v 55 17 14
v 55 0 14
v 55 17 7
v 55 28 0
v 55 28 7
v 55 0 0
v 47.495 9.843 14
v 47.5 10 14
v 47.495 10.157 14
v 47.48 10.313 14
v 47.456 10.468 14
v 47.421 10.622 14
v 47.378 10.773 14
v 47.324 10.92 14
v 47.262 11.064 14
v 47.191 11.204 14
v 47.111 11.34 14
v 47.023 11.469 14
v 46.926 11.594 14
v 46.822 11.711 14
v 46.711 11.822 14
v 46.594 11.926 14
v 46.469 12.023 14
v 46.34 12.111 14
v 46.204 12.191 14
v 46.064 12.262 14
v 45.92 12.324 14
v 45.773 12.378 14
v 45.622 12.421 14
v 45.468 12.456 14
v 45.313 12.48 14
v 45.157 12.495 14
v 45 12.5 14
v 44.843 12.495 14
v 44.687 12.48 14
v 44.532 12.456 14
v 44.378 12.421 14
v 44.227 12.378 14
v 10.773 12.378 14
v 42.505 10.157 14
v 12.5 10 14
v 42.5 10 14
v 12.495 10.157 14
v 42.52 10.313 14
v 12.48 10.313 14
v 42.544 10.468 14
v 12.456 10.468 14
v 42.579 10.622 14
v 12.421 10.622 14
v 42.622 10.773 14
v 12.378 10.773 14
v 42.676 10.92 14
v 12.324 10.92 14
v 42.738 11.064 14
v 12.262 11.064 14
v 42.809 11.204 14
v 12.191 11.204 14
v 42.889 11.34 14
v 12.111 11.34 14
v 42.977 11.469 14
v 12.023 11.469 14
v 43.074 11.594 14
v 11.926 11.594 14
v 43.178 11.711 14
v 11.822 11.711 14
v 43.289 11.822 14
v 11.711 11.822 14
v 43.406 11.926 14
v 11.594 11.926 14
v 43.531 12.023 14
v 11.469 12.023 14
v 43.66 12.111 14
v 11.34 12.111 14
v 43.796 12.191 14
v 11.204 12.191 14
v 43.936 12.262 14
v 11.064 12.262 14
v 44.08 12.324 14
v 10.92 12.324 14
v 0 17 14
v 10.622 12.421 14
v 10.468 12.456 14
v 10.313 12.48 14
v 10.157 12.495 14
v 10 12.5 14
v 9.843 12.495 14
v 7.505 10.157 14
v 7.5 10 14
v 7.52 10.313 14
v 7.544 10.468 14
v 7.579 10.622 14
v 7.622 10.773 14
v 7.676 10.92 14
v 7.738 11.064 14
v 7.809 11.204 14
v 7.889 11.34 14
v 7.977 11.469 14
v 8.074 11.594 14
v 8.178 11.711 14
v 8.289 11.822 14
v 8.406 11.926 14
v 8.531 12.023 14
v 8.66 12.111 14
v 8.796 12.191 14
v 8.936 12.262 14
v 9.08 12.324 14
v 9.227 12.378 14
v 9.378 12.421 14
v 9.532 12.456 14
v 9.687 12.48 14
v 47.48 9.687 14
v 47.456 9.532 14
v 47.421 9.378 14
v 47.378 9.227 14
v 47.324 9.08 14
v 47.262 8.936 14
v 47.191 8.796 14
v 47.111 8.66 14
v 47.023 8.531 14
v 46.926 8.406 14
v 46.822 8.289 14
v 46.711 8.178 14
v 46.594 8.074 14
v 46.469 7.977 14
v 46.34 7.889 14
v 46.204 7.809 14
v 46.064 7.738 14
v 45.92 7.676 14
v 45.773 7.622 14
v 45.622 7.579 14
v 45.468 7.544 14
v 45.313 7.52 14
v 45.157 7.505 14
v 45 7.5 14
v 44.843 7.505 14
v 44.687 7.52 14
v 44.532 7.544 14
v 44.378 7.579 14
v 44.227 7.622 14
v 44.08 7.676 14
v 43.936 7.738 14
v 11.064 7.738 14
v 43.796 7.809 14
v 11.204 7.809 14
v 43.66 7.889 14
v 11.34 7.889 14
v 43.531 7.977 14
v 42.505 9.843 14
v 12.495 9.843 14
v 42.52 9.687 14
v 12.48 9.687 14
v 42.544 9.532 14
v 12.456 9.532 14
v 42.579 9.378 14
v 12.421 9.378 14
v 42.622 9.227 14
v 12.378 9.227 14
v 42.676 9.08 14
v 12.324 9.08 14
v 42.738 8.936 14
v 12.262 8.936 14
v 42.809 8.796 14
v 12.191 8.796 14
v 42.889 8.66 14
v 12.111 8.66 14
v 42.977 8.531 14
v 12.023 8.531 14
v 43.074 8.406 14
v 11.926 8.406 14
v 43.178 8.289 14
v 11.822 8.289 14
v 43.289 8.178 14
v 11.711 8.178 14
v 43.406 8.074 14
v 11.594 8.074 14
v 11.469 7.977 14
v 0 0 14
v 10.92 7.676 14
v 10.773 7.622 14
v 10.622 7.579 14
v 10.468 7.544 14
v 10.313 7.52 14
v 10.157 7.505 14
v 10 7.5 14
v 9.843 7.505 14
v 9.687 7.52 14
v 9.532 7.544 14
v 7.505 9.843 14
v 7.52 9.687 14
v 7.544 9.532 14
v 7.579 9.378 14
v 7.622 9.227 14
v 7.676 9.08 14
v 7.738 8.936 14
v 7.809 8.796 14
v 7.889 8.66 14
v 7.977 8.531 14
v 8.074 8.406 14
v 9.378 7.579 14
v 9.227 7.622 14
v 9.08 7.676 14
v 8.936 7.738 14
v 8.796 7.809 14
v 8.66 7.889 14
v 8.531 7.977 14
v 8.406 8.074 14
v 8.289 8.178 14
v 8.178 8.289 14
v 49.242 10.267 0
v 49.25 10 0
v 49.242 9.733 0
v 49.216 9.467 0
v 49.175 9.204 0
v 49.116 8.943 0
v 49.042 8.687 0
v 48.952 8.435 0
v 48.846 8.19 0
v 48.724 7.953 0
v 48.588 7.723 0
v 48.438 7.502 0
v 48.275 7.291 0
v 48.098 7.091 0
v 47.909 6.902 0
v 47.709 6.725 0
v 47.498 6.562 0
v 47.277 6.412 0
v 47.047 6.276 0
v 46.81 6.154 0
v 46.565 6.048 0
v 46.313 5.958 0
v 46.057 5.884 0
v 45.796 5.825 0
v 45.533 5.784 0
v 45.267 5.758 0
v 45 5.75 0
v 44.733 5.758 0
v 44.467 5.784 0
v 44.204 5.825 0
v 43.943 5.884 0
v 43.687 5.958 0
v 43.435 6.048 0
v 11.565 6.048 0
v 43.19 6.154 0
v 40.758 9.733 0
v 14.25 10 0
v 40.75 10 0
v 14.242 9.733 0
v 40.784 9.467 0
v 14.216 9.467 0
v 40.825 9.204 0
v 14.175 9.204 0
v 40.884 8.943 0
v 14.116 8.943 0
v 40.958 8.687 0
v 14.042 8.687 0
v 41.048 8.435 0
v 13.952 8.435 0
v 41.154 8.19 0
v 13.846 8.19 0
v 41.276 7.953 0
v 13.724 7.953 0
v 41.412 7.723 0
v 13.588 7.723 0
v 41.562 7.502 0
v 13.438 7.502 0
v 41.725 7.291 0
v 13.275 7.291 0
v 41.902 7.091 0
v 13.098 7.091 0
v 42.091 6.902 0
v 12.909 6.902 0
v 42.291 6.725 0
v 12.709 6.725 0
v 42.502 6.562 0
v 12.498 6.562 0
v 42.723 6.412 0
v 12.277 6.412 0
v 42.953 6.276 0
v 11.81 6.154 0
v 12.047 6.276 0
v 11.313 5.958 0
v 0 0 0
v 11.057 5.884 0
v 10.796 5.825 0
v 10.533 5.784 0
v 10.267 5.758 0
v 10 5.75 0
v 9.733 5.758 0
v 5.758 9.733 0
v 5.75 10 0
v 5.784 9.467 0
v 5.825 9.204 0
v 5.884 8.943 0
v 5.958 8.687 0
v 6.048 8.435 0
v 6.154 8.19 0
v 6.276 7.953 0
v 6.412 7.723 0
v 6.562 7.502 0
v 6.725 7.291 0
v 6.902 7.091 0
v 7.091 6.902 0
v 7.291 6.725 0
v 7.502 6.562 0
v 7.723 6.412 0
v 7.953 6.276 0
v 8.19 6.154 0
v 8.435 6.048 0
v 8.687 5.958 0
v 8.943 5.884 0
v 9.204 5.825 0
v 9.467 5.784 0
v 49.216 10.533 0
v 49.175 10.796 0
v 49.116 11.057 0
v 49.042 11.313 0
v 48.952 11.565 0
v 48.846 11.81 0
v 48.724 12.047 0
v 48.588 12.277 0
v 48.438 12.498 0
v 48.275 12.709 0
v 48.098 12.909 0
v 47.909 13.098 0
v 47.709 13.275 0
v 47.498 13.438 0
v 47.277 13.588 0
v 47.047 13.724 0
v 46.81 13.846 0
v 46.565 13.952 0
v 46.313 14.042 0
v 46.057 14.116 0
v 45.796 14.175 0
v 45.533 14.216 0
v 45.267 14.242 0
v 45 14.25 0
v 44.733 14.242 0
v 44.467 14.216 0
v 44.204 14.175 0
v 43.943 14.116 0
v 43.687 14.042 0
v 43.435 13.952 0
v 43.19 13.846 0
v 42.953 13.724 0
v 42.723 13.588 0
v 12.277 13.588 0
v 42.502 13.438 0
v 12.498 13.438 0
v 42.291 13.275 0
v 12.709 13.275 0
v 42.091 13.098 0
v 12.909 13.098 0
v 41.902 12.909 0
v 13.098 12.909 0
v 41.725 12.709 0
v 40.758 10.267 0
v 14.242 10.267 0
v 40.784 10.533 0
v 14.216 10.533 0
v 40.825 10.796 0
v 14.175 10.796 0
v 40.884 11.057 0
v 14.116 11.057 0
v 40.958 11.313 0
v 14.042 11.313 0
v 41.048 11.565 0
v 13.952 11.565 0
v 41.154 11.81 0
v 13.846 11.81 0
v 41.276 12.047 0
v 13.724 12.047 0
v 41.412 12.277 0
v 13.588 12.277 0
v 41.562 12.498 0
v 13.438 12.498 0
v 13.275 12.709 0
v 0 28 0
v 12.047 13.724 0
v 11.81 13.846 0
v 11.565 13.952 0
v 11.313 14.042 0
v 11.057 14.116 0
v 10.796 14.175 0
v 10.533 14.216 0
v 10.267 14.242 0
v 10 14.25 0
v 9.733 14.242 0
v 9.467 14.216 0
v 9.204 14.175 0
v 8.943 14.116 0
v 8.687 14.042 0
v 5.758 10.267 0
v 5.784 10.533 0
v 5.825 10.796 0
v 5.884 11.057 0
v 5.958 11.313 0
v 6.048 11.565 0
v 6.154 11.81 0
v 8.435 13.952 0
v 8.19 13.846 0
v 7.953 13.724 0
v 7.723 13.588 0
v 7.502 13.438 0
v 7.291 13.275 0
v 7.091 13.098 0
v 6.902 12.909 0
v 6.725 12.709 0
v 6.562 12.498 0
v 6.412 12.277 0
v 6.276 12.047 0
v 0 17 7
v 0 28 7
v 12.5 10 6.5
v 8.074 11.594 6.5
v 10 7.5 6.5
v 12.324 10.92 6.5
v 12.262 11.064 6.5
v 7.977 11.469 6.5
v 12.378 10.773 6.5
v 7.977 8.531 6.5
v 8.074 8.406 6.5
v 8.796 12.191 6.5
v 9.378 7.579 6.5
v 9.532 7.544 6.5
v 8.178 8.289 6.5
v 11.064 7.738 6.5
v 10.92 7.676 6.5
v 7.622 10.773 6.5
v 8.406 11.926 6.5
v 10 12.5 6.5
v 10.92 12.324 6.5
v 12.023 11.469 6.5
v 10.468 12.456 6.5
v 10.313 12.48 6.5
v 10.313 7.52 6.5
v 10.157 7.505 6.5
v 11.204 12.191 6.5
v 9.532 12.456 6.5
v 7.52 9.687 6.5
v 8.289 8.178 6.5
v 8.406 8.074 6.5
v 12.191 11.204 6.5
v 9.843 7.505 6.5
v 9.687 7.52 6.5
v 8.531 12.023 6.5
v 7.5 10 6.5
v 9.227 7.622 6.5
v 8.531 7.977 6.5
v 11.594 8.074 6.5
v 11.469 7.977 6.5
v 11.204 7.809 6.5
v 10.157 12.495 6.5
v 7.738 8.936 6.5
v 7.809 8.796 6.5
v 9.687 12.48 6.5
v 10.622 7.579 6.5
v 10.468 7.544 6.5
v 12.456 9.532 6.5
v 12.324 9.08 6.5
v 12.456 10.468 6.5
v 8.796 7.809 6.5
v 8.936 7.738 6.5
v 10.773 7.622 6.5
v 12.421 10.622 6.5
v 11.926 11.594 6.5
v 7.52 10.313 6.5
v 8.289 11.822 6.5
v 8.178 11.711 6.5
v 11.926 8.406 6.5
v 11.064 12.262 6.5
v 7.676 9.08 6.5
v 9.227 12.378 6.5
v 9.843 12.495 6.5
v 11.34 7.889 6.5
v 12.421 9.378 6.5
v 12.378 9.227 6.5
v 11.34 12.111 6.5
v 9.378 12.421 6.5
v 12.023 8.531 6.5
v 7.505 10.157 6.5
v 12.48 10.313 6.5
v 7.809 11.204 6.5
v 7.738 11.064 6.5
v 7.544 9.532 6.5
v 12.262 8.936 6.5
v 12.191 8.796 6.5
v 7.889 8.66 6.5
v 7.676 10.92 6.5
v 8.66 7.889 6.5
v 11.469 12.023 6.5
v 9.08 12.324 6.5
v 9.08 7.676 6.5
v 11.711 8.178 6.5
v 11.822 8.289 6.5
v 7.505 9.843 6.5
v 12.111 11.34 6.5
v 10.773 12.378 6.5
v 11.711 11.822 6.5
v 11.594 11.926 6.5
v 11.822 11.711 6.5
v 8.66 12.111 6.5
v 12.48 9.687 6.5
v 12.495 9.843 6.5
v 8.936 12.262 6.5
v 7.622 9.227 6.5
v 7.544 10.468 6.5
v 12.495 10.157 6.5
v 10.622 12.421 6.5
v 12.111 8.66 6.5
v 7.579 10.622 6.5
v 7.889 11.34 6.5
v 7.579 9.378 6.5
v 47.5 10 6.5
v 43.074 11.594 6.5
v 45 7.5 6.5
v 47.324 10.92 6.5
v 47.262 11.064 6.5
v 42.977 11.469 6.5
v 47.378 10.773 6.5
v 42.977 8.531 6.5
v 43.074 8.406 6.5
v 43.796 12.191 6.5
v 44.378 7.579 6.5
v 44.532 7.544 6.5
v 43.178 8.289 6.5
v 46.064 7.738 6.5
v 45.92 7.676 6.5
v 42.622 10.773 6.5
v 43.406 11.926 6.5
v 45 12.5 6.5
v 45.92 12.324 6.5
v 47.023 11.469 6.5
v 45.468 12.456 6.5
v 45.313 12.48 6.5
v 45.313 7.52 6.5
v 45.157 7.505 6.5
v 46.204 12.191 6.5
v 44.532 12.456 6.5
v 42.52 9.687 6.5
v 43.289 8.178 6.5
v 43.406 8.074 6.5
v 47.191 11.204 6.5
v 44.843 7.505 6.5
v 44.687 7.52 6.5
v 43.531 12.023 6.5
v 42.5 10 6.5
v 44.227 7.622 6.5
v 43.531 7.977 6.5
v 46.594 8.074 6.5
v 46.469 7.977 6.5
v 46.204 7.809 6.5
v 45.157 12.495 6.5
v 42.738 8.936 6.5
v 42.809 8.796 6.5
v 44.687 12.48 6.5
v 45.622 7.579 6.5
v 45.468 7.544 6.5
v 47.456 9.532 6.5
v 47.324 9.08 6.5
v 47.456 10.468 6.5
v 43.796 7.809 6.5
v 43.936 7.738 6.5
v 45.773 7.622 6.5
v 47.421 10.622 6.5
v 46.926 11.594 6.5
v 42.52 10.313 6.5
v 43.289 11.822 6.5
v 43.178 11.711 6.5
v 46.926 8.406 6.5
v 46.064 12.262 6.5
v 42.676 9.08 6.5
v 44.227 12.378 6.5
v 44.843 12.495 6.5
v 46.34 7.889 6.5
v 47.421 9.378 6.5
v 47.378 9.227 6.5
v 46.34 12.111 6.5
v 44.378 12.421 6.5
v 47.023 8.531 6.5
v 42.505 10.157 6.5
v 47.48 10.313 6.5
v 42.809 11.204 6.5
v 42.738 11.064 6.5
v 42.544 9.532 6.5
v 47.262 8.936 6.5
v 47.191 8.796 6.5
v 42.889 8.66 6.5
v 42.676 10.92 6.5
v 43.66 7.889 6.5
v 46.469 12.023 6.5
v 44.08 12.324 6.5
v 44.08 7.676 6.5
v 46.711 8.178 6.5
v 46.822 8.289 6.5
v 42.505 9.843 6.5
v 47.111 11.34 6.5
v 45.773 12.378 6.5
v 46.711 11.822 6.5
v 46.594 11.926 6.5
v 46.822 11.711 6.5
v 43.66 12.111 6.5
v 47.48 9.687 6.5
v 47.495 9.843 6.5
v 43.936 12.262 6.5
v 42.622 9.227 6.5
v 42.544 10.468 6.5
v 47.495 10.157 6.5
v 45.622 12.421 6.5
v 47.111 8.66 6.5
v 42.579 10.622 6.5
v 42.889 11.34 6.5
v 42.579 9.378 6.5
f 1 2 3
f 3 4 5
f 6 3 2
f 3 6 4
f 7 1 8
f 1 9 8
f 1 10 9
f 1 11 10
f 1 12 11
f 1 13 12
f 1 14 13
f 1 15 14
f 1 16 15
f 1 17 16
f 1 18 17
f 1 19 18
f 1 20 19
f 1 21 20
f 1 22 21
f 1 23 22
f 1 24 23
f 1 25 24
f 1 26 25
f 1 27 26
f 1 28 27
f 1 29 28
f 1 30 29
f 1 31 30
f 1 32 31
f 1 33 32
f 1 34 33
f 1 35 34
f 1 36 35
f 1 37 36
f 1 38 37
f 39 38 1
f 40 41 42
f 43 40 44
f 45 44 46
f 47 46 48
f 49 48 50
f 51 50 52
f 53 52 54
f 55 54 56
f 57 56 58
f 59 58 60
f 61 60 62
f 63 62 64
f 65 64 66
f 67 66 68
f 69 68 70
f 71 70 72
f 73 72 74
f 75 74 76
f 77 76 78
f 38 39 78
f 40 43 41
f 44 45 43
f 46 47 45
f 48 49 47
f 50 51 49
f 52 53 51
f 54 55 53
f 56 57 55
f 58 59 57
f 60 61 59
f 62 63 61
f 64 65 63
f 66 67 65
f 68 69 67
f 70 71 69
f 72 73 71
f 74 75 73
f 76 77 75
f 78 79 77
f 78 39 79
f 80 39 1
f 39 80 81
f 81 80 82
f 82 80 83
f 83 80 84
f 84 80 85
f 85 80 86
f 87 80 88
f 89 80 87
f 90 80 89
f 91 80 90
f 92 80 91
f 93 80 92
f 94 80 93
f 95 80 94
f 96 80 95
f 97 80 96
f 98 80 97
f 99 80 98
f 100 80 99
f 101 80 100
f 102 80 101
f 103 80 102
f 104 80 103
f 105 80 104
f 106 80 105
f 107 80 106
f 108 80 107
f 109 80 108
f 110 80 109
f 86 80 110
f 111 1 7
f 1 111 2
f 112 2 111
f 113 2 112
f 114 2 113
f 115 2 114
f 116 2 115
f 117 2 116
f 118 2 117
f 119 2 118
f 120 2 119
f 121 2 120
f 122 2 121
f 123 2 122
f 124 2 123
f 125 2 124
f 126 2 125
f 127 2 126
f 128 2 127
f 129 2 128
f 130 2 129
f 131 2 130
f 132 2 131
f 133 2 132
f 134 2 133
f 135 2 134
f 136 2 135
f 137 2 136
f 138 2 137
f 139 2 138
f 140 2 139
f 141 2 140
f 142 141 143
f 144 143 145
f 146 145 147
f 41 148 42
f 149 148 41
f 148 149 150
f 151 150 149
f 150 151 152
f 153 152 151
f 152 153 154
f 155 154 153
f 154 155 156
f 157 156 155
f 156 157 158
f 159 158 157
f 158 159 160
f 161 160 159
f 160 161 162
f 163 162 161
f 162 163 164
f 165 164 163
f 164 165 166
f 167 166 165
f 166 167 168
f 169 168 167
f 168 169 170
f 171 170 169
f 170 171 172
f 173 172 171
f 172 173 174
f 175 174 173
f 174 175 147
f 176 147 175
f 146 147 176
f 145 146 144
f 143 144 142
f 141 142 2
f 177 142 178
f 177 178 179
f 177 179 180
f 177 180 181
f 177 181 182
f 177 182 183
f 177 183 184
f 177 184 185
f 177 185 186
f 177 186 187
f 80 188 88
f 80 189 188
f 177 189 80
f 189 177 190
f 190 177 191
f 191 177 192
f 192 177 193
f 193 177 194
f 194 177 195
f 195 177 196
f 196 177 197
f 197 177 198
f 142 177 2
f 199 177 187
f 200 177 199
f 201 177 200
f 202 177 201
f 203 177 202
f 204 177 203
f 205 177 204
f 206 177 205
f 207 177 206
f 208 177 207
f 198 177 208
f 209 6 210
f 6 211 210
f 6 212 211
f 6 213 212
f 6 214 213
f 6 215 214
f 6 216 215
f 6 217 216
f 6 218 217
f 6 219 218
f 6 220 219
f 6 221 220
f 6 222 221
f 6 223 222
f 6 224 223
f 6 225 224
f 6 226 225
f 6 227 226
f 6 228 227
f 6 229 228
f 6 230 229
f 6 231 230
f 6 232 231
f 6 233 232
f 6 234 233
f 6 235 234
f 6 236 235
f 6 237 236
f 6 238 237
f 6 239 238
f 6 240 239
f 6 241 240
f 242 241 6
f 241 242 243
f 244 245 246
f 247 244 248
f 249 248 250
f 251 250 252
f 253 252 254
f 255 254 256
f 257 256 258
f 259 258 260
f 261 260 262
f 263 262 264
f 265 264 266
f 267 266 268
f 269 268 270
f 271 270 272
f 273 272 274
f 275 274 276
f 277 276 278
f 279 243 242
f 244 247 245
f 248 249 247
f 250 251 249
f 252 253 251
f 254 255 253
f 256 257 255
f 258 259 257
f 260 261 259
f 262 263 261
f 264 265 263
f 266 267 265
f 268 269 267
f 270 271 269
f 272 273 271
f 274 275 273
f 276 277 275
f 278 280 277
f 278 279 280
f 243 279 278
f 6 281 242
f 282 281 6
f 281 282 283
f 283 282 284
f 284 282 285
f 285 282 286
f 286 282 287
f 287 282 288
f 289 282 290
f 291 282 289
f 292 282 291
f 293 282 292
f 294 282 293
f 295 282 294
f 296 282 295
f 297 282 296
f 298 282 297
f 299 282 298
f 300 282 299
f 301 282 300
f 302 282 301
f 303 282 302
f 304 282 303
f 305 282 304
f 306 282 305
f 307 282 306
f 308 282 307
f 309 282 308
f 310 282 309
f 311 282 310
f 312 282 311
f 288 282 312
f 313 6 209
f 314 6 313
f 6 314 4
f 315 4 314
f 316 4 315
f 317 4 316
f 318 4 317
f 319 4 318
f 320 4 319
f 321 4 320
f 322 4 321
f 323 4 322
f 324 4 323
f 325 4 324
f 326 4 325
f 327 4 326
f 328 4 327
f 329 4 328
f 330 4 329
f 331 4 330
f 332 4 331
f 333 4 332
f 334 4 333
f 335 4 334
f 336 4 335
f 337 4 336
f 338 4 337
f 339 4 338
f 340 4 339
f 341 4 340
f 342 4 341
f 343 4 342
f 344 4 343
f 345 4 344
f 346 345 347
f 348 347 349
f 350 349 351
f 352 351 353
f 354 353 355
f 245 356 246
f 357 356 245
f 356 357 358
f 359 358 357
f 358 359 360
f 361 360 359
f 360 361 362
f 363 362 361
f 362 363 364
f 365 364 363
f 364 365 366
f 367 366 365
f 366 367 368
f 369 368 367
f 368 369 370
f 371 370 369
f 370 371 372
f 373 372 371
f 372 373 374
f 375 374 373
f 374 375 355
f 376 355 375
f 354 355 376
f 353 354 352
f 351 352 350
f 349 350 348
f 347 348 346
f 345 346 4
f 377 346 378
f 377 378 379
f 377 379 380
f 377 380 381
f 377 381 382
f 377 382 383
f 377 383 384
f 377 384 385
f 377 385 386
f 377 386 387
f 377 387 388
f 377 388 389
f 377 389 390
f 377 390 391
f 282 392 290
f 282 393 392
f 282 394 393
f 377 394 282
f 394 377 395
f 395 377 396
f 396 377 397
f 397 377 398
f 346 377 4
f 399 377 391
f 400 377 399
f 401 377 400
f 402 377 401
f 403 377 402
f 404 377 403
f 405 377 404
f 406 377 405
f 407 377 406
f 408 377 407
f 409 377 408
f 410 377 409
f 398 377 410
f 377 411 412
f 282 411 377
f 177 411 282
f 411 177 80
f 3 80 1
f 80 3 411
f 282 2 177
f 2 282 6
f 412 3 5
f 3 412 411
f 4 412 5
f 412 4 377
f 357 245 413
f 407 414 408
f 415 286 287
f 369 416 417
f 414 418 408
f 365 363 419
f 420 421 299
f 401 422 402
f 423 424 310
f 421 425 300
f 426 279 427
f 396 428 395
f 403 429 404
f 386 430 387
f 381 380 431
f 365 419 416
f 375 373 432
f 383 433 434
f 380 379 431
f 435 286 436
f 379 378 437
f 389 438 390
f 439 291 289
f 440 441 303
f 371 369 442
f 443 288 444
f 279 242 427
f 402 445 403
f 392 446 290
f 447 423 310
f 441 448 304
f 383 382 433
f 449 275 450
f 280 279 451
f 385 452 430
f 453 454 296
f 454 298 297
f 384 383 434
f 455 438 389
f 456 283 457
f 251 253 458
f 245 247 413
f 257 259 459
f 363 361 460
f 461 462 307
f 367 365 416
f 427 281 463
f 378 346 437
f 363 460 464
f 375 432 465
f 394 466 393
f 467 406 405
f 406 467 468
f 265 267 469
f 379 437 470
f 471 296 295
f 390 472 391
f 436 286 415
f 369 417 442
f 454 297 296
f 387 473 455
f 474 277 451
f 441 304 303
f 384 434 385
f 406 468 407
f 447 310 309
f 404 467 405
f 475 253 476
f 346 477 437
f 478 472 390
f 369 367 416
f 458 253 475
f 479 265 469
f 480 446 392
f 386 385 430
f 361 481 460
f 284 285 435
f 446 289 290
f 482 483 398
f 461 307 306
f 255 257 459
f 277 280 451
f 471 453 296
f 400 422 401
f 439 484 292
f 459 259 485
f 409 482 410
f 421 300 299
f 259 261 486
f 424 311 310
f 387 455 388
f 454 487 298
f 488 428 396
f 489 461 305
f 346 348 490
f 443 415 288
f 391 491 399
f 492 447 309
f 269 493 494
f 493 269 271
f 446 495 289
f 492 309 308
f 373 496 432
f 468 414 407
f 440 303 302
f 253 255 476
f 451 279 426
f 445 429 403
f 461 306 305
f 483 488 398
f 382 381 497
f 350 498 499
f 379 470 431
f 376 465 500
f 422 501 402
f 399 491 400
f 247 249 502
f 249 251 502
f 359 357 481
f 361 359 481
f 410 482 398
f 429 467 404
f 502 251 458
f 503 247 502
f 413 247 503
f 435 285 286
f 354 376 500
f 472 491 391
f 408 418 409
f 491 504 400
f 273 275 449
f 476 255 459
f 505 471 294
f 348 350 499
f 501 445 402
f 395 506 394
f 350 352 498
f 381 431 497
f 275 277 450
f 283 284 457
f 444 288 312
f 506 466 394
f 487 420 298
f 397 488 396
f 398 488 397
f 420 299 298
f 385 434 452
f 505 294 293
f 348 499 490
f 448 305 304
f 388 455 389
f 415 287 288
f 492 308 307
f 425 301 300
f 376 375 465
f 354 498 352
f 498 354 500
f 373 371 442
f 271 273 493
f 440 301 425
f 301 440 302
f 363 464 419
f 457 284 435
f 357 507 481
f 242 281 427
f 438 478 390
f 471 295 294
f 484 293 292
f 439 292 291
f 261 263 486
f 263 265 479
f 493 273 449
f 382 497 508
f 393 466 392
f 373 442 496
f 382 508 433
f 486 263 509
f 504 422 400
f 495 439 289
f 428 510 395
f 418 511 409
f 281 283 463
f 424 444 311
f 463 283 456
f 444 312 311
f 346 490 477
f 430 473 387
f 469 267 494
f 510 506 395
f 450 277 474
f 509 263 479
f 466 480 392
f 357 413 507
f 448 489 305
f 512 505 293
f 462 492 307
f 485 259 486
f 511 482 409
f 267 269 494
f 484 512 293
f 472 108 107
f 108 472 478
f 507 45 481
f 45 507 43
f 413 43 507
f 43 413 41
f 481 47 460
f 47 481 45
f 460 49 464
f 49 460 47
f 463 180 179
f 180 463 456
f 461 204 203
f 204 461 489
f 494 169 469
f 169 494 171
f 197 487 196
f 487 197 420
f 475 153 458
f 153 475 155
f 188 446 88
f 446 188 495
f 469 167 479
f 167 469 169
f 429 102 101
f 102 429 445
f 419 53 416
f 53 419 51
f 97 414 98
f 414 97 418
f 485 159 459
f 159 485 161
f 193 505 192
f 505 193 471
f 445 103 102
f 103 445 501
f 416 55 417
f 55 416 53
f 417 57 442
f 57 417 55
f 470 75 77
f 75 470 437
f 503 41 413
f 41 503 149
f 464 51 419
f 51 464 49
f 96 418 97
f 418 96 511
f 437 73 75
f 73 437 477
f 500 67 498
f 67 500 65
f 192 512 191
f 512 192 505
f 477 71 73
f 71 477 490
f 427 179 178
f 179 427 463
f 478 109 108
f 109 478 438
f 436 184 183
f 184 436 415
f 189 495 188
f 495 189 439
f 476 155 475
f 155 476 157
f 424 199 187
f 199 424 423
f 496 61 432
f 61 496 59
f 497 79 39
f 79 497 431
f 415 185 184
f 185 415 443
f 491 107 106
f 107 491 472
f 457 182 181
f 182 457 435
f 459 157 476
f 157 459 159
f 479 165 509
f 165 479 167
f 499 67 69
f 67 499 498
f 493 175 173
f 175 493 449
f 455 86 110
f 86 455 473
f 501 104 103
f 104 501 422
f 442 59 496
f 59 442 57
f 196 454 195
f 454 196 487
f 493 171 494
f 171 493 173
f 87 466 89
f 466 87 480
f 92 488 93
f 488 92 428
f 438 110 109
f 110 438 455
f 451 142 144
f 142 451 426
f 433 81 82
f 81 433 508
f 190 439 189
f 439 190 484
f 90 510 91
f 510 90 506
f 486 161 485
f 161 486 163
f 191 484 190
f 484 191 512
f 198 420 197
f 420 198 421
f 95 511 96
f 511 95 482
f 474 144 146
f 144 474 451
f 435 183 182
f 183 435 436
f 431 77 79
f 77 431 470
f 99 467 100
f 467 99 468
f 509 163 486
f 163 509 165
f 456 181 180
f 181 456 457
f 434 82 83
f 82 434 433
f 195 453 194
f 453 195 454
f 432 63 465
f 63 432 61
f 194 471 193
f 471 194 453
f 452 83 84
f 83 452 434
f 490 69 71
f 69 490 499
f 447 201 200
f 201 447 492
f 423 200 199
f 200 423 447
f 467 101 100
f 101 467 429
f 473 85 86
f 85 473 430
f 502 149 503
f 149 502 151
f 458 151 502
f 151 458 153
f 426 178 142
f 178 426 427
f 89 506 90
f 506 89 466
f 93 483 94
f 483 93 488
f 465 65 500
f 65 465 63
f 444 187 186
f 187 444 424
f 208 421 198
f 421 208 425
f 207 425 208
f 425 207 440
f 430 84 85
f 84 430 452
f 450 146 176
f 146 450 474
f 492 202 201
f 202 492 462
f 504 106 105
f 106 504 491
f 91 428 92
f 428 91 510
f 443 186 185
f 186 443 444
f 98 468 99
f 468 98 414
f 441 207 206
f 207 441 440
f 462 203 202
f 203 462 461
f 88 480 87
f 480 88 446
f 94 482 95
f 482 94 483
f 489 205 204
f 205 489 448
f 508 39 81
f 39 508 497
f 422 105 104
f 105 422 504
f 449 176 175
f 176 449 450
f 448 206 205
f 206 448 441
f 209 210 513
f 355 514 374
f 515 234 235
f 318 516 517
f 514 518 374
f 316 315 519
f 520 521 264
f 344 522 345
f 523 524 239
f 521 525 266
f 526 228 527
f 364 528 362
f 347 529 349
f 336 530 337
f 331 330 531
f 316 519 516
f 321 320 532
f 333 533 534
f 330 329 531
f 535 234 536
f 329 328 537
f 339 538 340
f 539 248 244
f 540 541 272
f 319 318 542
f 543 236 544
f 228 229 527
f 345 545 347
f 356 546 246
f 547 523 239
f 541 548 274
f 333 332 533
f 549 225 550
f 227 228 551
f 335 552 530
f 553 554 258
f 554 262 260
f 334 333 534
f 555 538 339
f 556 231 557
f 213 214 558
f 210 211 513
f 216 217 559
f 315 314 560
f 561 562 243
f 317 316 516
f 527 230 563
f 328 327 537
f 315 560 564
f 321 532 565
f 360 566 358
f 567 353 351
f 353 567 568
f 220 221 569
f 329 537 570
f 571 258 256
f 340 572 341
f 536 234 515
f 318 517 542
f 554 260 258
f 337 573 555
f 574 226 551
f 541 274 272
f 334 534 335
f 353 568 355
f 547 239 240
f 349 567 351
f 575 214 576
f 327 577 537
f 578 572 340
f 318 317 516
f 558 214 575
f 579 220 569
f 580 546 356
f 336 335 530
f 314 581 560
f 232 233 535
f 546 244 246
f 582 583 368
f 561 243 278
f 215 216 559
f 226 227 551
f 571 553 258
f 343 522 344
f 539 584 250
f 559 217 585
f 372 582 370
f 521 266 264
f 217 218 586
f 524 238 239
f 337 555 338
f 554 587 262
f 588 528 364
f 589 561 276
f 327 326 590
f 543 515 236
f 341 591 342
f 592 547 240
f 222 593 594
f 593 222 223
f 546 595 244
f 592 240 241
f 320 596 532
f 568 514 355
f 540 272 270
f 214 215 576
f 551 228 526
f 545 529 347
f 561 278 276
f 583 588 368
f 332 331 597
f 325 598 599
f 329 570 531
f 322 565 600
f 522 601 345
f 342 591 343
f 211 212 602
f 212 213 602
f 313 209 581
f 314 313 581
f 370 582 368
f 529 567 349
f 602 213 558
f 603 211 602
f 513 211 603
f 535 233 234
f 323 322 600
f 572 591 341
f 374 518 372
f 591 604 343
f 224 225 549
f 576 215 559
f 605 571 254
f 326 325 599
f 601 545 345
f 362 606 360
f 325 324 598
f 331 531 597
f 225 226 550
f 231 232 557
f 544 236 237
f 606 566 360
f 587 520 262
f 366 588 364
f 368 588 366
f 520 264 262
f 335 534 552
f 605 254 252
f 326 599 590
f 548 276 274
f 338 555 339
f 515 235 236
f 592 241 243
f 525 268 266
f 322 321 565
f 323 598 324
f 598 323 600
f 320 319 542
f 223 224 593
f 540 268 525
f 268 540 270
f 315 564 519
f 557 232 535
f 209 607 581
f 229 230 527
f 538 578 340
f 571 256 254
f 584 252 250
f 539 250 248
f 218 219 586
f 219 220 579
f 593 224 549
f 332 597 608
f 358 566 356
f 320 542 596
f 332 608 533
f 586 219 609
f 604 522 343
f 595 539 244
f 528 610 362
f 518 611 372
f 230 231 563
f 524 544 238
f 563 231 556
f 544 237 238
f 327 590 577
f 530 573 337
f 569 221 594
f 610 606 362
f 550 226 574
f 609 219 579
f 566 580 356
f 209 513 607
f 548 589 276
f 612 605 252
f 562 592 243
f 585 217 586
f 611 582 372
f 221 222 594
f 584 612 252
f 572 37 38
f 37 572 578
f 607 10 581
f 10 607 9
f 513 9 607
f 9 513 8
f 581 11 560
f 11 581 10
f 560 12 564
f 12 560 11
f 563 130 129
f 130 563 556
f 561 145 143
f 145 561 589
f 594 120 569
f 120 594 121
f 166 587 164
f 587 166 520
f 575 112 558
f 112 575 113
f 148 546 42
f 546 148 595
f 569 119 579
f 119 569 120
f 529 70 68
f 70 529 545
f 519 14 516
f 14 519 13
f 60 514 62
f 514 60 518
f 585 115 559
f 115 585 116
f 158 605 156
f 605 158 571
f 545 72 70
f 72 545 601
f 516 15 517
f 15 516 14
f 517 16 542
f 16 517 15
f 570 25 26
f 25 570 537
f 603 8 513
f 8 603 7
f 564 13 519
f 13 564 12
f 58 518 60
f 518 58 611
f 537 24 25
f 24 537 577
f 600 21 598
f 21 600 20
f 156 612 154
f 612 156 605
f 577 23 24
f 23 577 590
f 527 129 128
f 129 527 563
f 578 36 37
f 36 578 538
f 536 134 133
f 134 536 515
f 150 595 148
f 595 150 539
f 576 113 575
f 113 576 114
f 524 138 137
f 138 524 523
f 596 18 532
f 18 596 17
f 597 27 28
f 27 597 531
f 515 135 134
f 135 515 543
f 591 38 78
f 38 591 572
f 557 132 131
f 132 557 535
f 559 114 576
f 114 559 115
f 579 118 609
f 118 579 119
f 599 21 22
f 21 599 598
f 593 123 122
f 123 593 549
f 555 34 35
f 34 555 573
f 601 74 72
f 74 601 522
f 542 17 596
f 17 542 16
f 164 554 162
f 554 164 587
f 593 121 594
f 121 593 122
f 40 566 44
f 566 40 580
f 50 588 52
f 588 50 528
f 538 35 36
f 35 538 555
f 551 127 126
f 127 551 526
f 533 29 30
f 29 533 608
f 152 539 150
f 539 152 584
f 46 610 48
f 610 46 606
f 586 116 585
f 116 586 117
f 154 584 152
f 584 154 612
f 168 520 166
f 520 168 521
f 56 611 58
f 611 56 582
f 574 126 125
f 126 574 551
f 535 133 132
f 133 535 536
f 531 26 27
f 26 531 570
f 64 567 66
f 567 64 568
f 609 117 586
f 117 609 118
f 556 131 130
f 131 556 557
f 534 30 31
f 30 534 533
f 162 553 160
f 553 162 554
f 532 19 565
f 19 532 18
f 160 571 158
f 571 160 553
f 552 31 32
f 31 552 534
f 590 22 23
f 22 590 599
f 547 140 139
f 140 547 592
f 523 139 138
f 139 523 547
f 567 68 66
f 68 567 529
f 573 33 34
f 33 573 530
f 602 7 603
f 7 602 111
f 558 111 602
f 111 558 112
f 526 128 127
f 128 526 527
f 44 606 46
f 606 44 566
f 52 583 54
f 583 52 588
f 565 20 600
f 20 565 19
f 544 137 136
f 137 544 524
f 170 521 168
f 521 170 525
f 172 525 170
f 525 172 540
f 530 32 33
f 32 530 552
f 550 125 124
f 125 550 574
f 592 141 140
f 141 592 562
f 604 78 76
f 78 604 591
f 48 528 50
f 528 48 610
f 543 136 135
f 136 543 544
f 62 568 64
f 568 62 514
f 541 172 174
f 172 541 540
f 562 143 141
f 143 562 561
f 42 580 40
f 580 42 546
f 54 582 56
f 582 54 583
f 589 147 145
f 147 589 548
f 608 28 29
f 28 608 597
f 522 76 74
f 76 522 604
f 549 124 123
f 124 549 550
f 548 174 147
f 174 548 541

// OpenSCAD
cleat_x = 55;
cleat_y = 17;
cleat_z = 14;

hook_x = 55;
hook_y = 11;
hook_z = 7;


screw_head_r = 8.5 / 2;
screw_head_length = 6.5;
screwn_shaft_r = 5 / 2;
screw_length = 63;

$fn = 100;

module screw(screw_length, screw_head_length, screwn_shaft_r, screw_head_r) {
    union() {
        cylinder(screw_head_length, screw_head_r, screwn_shaft_r);
        translate([0, 0, screw_head_length]) {
            cylinder(h = screw_length, r = screwn_shaft_r);
        }
    }
} 

difference() {
    union() {
        cube([cleat_x, cleat_y, cleat_z]);
        translate([0, cleat_y, 0]) {
            cube([hook_x, hook_y, hook_z]);
        }
    }


    translate([10, 10, 0]) {
        screw(screw_length, screw_head_length, screwn_shaft_r, screw_head_r);
    }

    translate([(cleat_x - 10), 10, 0]) {
        screw(screw_length, screw_head_length, screwn_shaft_r, screw_head_r);
    }
}
